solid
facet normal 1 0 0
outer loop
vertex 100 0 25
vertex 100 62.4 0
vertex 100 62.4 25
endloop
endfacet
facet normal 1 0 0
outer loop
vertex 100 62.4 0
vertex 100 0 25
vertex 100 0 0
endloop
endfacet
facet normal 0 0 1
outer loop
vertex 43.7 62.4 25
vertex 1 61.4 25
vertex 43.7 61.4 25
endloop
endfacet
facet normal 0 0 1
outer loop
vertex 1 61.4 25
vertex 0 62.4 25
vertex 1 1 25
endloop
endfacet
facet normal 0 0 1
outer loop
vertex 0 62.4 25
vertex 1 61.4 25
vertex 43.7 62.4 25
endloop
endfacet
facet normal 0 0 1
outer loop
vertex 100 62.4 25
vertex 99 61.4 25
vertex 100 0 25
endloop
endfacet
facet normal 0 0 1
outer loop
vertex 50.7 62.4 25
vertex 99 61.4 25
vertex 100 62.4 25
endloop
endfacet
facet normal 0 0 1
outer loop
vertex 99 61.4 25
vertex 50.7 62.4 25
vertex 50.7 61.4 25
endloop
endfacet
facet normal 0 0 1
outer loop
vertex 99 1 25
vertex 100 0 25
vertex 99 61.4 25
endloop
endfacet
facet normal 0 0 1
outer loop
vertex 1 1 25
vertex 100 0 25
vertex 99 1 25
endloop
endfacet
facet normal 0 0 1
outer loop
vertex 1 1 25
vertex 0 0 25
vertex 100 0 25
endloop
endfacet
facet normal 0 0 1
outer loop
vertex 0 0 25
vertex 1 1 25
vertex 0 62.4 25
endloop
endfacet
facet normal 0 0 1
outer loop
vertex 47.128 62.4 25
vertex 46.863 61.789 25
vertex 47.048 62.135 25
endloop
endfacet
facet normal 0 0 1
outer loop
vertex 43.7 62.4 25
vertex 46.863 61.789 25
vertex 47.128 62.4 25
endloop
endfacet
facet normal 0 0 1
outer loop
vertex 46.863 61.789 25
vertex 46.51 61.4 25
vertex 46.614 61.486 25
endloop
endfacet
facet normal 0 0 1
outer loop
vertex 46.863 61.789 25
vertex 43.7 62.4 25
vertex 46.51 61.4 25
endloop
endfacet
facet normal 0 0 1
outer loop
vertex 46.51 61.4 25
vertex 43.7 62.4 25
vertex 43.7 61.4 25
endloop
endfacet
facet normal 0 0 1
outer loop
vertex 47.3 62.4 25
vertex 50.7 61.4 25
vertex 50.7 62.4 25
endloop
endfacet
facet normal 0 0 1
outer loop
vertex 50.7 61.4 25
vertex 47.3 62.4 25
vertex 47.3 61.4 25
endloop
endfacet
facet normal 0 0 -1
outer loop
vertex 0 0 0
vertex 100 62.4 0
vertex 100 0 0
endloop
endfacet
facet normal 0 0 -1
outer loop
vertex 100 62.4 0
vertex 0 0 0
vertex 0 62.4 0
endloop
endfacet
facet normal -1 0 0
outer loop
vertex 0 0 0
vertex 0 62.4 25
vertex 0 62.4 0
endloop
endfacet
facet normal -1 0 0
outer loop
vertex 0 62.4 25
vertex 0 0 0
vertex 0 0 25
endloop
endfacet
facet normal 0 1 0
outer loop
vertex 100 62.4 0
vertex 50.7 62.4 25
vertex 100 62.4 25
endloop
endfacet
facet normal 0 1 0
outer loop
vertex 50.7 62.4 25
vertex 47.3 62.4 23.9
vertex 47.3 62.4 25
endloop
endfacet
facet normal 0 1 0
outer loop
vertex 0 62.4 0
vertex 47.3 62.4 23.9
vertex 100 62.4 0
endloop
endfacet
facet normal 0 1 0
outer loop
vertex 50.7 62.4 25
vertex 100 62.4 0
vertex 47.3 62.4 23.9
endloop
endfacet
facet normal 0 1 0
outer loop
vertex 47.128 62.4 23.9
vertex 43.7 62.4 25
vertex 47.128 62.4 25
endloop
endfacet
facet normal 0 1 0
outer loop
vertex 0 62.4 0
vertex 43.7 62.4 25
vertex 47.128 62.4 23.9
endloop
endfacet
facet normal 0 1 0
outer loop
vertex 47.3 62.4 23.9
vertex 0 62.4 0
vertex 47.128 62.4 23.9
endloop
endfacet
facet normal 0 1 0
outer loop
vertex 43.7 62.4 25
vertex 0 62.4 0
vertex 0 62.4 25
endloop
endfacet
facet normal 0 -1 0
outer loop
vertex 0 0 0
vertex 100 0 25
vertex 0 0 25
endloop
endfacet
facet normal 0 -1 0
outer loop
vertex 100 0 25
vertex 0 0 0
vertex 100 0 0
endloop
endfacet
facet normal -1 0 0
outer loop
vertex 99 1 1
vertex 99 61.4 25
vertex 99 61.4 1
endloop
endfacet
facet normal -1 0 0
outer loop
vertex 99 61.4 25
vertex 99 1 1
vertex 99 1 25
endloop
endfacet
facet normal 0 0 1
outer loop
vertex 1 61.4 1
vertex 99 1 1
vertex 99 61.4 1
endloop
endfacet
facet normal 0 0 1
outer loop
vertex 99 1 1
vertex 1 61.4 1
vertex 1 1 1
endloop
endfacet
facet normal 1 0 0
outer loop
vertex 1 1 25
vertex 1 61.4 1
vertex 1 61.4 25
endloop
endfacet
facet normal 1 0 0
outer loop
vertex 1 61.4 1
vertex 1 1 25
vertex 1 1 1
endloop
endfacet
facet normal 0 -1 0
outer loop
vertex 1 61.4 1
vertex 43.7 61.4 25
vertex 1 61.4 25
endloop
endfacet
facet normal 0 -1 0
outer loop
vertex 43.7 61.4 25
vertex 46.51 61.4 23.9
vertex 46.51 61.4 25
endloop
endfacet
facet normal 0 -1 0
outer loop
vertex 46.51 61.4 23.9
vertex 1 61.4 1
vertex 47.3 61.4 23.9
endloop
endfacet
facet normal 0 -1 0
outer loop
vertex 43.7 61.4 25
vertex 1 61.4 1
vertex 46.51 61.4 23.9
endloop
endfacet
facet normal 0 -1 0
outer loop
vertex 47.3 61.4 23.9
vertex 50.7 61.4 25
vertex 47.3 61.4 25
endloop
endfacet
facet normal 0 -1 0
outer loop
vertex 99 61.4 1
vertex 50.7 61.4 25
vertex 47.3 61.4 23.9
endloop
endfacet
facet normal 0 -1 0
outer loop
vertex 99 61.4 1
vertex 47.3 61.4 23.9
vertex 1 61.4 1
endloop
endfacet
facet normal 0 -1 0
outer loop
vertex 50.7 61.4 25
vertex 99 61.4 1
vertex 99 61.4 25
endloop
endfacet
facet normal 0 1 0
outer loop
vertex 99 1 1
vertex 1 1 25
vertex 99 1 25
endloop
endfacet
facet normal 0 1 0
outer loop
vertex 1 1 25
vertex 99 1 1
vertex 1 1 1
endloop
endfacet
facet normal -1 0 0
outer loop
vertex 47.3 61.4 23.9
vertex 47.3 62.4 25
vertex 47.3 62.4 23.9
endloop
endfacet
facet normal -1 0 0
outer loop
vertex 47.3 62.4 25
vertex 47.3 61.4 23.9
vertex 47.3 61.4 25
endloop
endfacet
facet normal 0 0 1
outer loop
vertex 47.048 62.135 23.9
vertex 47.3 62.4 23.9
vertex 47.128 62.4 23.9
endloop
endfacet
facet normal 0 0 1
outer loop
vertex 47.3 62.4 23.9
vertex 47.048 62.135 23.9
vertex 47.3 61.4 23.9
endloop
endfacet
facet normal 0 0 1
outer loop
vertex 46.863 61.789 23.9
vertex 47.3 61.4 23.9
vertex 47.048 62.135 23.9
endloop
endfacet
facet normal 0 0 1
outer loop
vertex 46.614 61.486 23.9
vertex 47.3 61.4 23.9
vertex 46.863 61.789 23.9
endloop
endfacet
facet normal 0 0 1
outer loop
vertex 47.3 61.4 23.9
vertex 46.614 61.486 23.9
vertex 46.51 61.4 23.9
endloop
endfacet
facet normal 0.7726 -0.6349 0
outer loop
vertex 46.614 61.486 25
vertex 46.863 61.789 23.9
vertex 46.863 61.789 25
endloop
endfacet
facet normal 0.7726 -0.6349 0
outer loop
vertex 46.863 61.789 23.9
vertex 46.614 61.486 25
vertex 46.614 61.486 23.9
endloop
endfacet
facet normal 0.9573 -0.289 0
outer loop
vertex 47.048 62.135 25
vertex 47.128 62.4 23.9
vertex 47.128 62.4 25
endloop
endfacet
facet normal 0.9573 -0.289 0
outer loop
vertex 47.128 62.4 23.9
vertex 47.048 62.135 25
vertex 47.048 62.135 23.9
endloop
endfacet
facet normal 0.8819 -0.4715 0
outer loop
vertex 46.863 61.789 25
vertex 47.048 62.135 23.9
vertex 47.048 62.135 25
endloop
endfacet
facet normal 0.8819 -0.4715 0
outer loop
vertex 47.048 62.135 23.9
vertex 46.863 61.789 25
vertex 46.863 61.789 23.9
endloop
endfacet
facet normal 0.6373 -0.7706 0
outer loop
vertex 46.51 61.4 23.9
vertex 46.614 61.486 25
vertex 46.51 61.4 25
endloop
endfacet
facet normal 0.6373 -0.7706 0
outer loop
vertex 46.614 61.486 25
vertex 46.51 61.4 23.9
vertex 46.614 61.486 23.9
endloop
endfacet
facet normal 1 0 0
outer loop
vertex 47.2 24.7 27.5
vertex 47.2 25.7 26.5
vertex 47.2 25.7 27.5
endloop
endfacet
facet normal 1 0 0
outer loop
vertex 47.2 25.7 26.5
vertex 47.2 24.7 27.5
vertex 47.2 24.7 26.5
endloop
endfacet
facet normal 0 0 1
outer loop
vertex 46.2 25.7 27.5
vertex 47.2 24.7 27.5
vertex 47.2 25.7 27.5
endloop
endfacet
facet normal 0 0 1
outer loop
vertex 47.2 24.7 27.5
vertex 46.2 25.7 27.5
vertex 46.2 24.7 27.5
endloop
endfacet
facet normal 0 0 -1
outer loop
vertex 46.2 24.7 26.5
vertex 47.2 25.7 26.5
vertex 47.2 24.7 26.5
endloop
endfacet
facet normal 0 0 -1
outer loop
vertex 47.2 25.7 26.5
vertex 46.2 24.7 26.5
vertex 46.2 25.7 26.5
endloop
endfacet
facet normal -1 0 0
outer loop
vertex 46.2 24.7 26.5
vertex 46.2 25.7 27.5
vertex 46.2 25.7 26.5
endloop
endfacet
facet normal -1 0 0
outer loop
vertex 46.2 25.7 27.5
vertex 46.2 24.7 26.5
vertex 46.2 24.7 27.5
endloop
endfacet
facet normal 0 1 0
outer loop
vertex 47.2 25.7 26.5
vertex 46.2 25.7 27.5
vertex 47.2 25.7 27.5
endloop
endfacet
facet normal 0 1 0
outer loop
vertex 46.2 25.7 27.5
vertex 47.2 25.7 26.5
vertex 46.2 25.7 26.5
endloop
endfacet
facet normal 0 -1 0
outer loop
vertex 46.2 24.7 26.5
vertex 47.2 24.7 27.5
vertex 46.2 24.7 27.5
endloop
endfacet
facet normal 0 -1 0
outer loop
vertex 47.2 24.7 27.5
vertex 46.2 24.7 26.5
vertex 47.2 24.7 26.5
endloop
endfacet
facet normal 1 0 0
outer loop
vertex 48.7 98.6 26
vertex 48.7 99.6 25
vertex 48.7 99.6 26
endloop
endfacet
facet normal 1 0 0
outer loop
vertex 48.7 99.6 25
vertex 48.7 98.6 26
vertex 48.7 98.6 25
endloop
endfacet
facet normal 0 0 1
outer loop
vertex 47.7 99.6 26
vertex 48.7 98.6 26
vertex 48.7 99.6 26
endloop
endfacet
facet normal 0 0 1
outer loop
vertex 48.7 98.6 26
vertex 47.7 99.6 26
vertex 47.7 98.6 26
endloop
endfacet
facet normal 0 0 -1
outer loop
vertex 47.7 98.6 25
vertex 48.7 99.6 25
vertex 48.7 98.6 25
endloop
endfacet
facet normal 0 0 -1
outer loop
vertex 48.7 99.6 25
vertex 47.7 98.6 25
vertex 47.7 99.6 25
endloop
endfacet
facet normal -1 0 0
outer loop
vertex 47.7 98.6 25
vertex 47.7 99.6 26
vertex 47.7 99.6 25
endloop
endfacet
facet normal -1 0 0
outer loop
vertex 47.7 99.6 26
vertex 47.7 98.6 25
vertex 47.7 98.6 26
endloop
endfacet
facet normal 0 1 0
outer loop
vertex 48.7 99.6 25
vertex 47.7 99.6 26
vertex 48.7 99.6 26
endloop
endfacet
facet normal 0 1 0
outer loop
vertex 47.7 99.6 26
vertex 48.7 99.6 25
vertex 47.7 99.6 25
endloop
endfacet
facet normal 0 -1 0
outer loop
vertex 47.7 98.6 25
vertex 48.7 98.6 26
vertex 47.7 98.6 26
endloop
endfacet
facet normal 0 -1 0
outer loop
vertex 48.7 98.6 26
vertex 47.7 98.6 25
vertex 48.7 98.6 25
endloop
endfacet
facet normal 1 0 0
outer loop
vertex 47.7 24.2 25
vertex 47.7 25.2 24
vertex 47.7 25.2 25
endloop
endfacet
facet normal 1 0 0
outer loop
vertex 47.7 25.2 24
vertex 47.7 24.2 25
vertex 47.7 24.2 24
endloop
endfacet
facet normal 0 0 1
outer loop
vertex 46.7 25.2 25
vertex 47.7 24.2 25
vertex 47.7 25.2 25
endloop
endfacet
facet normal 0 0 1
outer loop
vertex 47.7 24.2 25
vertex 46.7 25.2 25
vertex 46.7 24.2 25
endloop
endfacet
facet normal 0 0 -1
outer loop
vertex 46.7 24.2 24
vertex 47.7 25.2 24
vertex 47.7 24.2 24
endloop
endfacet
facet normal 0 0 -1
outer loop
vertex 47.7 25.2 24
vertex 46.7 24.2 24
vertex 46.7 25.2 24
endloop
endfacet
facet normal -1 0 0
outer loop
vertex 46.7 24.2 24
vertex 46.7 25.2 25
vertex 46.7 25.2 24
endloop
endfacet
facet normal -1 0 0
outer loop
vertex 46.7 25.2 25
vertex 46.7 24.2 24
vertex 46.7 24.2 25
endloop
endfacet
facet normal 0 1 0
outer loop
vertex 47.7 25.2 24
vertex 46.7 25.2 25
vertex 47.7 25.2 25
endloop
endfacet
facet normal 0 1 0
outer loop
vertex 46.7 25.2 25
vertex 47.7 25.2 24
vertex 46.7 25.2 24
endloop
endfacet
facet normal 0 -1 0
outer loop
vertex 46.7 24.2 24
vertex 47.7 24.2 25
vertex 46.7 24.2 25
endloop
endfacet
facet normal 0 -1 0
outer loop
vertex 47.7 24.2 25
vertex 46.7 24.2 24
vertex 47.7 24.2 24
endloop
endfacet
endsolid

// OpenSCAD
// file: testRC.scad
use<mylib.scad>;

t0 = 1;
// clang-format off
// test rc

  // idc?: color
  // rid: plane of corner cut (rotates the cut segment)
  // ---- 0: [-90,0,0] 1: [0, -90, 0] 2: [0, 0, -90]
  // rot: applied to given cube to put in in plane of rid
  // cxyz: cube to rotate
  // trans: for each corner; +/- cube radius
  // ss: show segment (false)
  module test(idc, rid, rot, cxyz, trans, ss = true) {
    if (idc) {
    translate(trans[0]) color("blue") cube([ 1, 1, 1 ], true);
    rc(trans[0], rid, 0, 5, t0, ss)
    rc(trans[1], rid, 1, 5, t0, ss)
    rc(trans[2], rid, 2, 5, t0, ss)
    rc(trans[3], rid, 3, 5, t0, ss)
    rotate(rot) color (idc)  cube(cxyz, true); // Y -> X
    }
  }
  module test0(idc, rid, rot, cxyz, trans, ss= false) {
    rrot = [ [ 0, -90, 0 ], [ -90, 0, 0 ], [ 0, 0, -90 ] ][rid];
    if (idc) {
    translate(trans[0]) color("blue") cube([ 1, 1, 1 ], true);
    rc0(trans[0], rid, 0, 5, t0, ss)
    rc0(trans[1], rid, 1, 5, t0, ss)
    rc0(trans[2], rid, 2, 5, t0, ss)
    rc0(trans[3], rid, 3, 5, t0, ss)
    rotate(rot) color(idc)  cube(cxyz, true); // Y -> X
    }
  }

module testRC() {
  t = t0;
  sz = false;
  szx = "tan";
  szy = "cyan";
  sx = false;
  sy0 = "green";//false; //
  syx = false;
  syxc = "#BBBBBB";// "#BBBBBB";
  syz = false;// "red";

  // rc() WORKS without test module!
  tt=t0/2; // offset because cube is rotated but not centered
  translate([20, 5, 0]) {
  translate([0,20,tt]) color("blue") cube([ 1, 1, 1 ], true);
  color("cyan") 
  rc([0,20,tt], 2, 0, 5, t0,true) 
  rc([20,20,tt], 2, 1, 5,t0,true) 
  rc([20,0,tt], 2, 2, 5, t0,true)
  rc([0,00,tt], 2, 3, 5, t0,true) 
  cube([20, 20, t0]);
  }

  // original test with rc0() [implicit gold]
  translate([-10, -30, 0]) 
  rc0([0,00,0], [0, 0, 0], 0, 5, t0,true) 
  rc0([0,20,0], [0, 0, 0], 1, 5,t0,true) 
  rc0([20,20,0], [0, 0, 0], 2, 5, t0,true)
  rc0([20,00,0], [0, 0, 0], 3, 5, t0,true) 
  cube([20, 20, t0]);

  gold = "gold";
  // z-axis test: using test0; fails because of module!
  translate([25, -20, 0]) 
  test0(gold, 2, [0, 0, 0], [20, 20, t0], [
    [-10,-10,-tt], [-10,10,-tt],[10,10,-tt], [10,-10,-tt]
  ], true) 

  // native Y -> X [green] (first test)
  test(syxc, 0, [0,0,-90], [20, t, 20], [
    [00,-10,-10],
    [00, 10,-10],
    [00, 10, 10],
    [00, -10,10]
    ]);
  // native Y -> Y [grey]
  translate([20,20,20])
  test(sy0, 0, [0,0,0], [20, t, 20], [
    [-10,00,10],
    [-10,00,-10],
    [10,00,-10],
    [10,00,10],
  ]);

  // native Y -> Z [red]
  test(syz, 2, [-90,0,0], [20, t, 20], [
    [-10,10,00],
    [10,10,00],
    [10,-10,00],
    [-10,-10,00],
  ]);

  // native Y -> Z [red]
  *if (syz) color (syz) 
  translate([0, 0, 0]) 
  rc0([00,20,0], [0, 0, -90], 0, 5, 1, syz) 
  rc0([20,20,00], [0, 0, -90], 1, 5, 1, syz) 
  rc0([20,00,00], [0, 0, -90], 2, 5, 1, syz)
  rc0([0,0,0], [0, 0, -90], 3, 5, 1, syz) 
  rotate([-90,0,0]) cube([20, t0, 20]); // y -> Z

  // native Z:
  if (sz) color(sz)
  translate([0, 0, 0]) 
  rc0([0,00,0], [0, 0, 0], 0, 5, 1, sz) 
  rc0([0,20,0], [0, 0, 0], 1, 5, 1, sz) 
  rc0([20,20,0], [0, 0, 0], 2, 5, 1, sz)
  rc0([20,00,0], [0, 0, 0], 3, 5, 1, sz) 
  cube([20, 20, t0]); // native: normal to Z

  // native Z rotated to X
  // if (szx) color(szx)
  // translate([0, 0, 0])
  // amul(csr, -rad)
  translate([-10, -20, -10]) 
  test(szx, 1, [0, -90, 0], [20, 20, t0], [
    [0,  -10, -10], [0, 10, -10], [0, 10, 10], [0, -10, 10], 
  ], true);

  // native Z rotated to Y
  test(szy, 0, [-90, 0, 0], [20, 20, t0], [
    [-10, 0,  10], [-10, 0, -10], [10, 0, -10], [10, 0, 10], 
  ])

*  if (szy) color(szy)
  translate([0, 0, 0]) 
  rc0([0,00,0], [-90, 0, 0], 0, 5, 1, szy) 
  rc0([0,0,-20], [-90, 0, 0], 1, 5, 1, szy) 
  rc0([20,0,-20], [-90, 0, 0], 2, 5, 1, szy)
  rc0([20,00,0], [-90, 0, 0], 3, 5, 1, szy) 
  rotate([-90, 0, 0]) cube([20, 20, t0]);

  // if (sy0) color (sy0) 
  // translate([0, 0, 0]) 
  // rc0([00,00,20], [-90, 0, 0], 0, 5, 1, sy0) 
  // rc0([00,00,00], [-90, 0, 0], 1, 5, 1, sy0) 
  // rc0([20,00,00], [-90, 0, 0], 2, 5, 1, sy0)
  // rc0([20,00,20], [-90, 0, 0], 3, 5, 1, sy0) 
  // cube([20, t0, 20]); // native normal = y

  // native Y -> X [green]
  if (syx) color (syx) 
  translate([0, 0, 0]) 
  rc0([00,-20,00], [0, -90, 0], 0, 5, 1, syx) 
  rc0([00,00,00], [0, -90, 0], 1, 5, 1, syx) 
  rc0([0,00,20], [0, -90, 0], 2, 5, 1, syx)
  rc0([0,-20,20], [0, -90, 0], 3, 5, 1, syx) 
  rotate([0,0,-90]) cube([20, t0, 20]); // Y -> X


}
// clang-format on
// main file
use <mylib.scad>;
p = .001;
pp = 2 * p;
t0 = 1.0;
l00 = 87; // official card size (according to Sleeve King )
w00 = 56;
l0 = 92.4;
w0 = 60.4;
h0 = 22;
h1 = h0 + 3; // extend for ramp!
l = l0 + 2 * t0;
w = w0 + 2 * t0;
h = h1 + t0;

// hypotenuse: given angle * adjacent_base length
function hypa(a, b) = (let(h = b * tan(a)) sqrt(b * b + h * h));
function hypo(a, h) = (let(b = h / tan(a)) sqrt(b * b + h * h));

// poke holes (children(1)) in children(0) through the y axis
// x: [x0, step, xm]
// z: [z0, step, zm]
// tr: [1,0,1] select axiis to translate
module gridify(x, z, tr = [ 1, 0, 1 ])
{
    for (xa = [x[0]:x[1]:x[2]], za = [z[0]:z[1]:z[2]])
    {
        // echo("xz=", [xa, za]);
        translate(amul([ xa, xa, za ], tr)) children(0);
    }
}
module grid(nx, nz, k, tr = [ 1, 0, 1 ])
{
    gridify([ k, 2 * k, nx ], [ 0, 2 * k, nz ], tr) children(0);
    gridify([ 0, 2 * k, nx ], [ k, 2 * k, nz ], tr) children(0);
}
module pat(s = 5, l = 30)
{
    rotatet([ 0, 45, 0 ], [ s / 2, 0, s / 2 ]) translate([ 0, -p, 0 ]) cube([ s, l + pp, s ]);
}

// grid test:
*translate([ 0, -40, 0 ])
{
    nx = 50;
    nz = 30;
    y = 1;
    s = 10;
    difference()
    {
        cube([ nx, y, nz ]);
        grid(nx, nz, s / 2) scale([ 1, 1, .7 ]) translate([ -s / 2, 0, -s / 2 ]) pat(s / 2, y);
    }
}

a = 18;
dz = 6;                 // top of slot
iw = 3.8;               // width of slot_interior
xb = (h - dz) * tan(a); // length of holder after tilt...
lt = l + xb;            // length total
echo("cardbox: xb, lt, lwh=", [ xb, lt, l, w, h ]);
// TODO: snap-on top!

module holder(a = a)
{
    xb = (h - dz) * tan(a); // length of holder after tilt...
    ha = (h - dz);
    echo();                // top to slot
    fw = iw + 2 * t0;      // full width of slot box
    hb = ha - fw / cos(a); // down from top to rotation point
    hr = ha - hb;
    sz = 5;   // depth to shelf
    echo("xb=", xb, "ha=", ha, "hb=", hb, "hr=", hr);
    wb = w0;
    intersection()
    {
        translate([ p - xb, 0, 0 ]) cube([ xb, w, h ]);
        {
            rotatet([ 0, -a, 0 ], [ 0, 0, dz ])
            {
                translate([ fw, 0, 0 ]) cube([ 7, w, 1.2 * h ]); // fill w/ giant block, then intersect
                {
                    bh = t0 + ((a > 1) ? ha / cos(a) : ha);
                    echo("bh=", bh);
                    translate([ 0, 0, dz ]) 
                    box([ fw, w, bh ], t0); // main box

                    translate([ 0, 0, bh - sz ]) 
                    rotatet([ 0, -18, 0 ], [ iw, 0, 2 * t0 ])
                    cube([ iw + t0, w, t0 ]); // bottom shelf
                }
            }
        }
    }
    // translate([-t0,0,-bl]) rotate([-90,0,0]) cylinder([iw+2*t0, w, bl]);
}

module card(tr = [ (l0 - l00) / 2, (w0 - w00) / 2, 0 ])
{
    translate(tr) astack(32, [ -.03, 0, .5 ]) color("pink") roundedCube([ l00, w00, .4 ], 3, true);
}

// vz: height of ramp @ vx: bump @
vz = 4.;
vx = .4 * l;
fl = 2;
vy = 5.6; // fl: flat length
module ramp(vx = vx, vz = vz, ve = 0)
{
    sa = sin(a2);
    ca = cos(a2);
    vz = (l - vx) * sa;
    vzt = vz + t0; // vz = 3.16
    intersection()
    {
        union()
        {
            rotatet([ 0, -a2-.2, 0 ], [ vx, 0, vz + t0 ]) 
            for (y = [0:(w - vy) / 4:w - vy]) 
            translate([ ve, y, 0 ])
              cube([ vx, vy, vz + t0 ]);
            translate([ vx, 0, 0 ]) cube([ 2.4, w, vz + t0 ]);
        }
        translate([ ve, 0, 0 ]) cube([ vx, w, vz + t0 ]);
    }
    dr = 14;
    intersection()
    {
        translate([ vx + (dr / 2 + .0) * t0, w / 2, vzt / 2 ]) rotate([ -90, 0, 0 ]) cube([ dr, vzt, w ], true);
        color("blue") translate([ vx + (dr / 2 + 0) * t0, w / 2, vzt / 2 ])
            rotatet([ 0, a2, 0 ], [ -dr / 2, 0, vzt / 2 ]) rotate([ -90, 0, 0 ])
                cube([ dr, vzt, w ], true); // no compound rotation!
    }
}
/* clang-format off */

/** try to hold inline cards, also a "lid" to hold cards in box
 @param dx length of tray
 @param dz height of wings
 @ambient w: width of box, t0: thickness
 */
module topTray(dx = l/4, dz = 5)
{

    f = .33;
    tw = w - 2 * t0;
    sw = 2 * t0;
    atrans(loc, [ [ l+2, 0, dx, [0, 90, 0] ], 
                [ (l-dx)/2-10, 0, h-dz+t0 ], 
                [ (l-dx)/2-10, 0, h-dz+t0+p ],
          ])
    /* clang-format on */
    {
        rz = 5;
        in = f;
        dup([ 0, w, 0], [0,0,180, [dx/2, 0, 0]])
        union() {
          translate([0, p+t0, 0]) cube([dx, w/2+t0+p, t0]);
          color("blue") translate([ p, p, p ]) 
            box([ dx, sw, dz ], [ -t0, -t0, -t0 ], [ 2, 0, 0 ]);
        }
    }
}


// box for setup (Events, VICI, markers, chips) cards:
module vbox()
{
  vw = l;
  vl = 22;
  vh = w; // as high as main box is wide
  sw = 55;// vw * .7;
  dh = 15; // depth of slot
  sr = min(5, dh/2, sw/2);
  hwtr = [dh, sw, 2*t0, sr];
  atrans(loc, [[0, -3, 0, [0,0,-90]], [0, -vw, 0], [0, -3, 0, [0,0,-90]]]){ 
  echo("vbox2:", [dh, sw, 2*t0, sr])
  slotify(hwtr, [00+t0/2, vw/2, vh-(dh/2-sr)], 1, 3, true)
  slotify(hwtr, [vl-t0/2, vw/2, vh-(dh/2-sr)], 1, 3, true)
    box([vl, vw, vh]);
  sz = 20/32 * vl;
  slotify(hwtr, [sz+t0/2, vw/2, vh-(dh/2-sr)], 1, 3, true)
    div([vh, vw, sz]);
  }
}

// add horizontal slot to children(0)
module hslot(dz = dz, dx = 0)
{
    sw = 2;
    sh = 4;
    difference()
    {
        union()
        children();
        translate([dx - (sw - pp) / 2, t0, dz - sh ]) 
        cube([ sw, w0, sh ]);
    }
    // support posts:
    dia = 1;
    dup([0, -w/4, 0])
    dup([0, +w/4, 0])
    translate([ 0, w / 2, 0 ]) cube([ dia, dia, dz ]);
}

// cut child(0) in XY plane @ depth: y0..y1
module cutaway0(loc = loc, cxyz = [ 10, 10, 10 ], txyz = [ -5, -5, -5 ])
{
    if (loc == 1)
    {
        difference()
        {
            children(0);
            translate(txyz) cube(cxyz);
        }
    }
    else
    {
        children(0);
    }
}
module cutaway(loc = loc)
{
    cutaway0(loc, [ lt + 10, 10, h + 10 ], [ -5 - xb, -5, -5 ]) children();
}

module paty(s = 5, l = w)
{
    scale([ 1, 1, .7 ]) translate([ -s / 4, 0, -s / 2.8 ]) pat(s / 2, l);
}
module patx(s = 5, l = w)
{
    scale([ 1, 1, .7 ]) translate([ 0, -s / 4, -s / 2.8 ]) rotatet([ 45, 0, 0 ], [ 0, s / 2, s / 2 ])
        translate([ -p, 0, 0 ]) cube([ l + pp, s, s ]);
}

module gridaway(x0 = 40, l = l * .65, h = 25)
{
    s = 10;
    difference()
    {
        children(0);
        translate([ x0, 0, t0 + s * .9 ]) grid(l - s - x0, h - s - 5, 5) paty(s, w);
    }
}
module gridawayy(x0 = 20, l = l)
{
    s = 10;
    difference()
    {
        children(0);
        translate([ x0, 0, t0 + s ]) grid(l - s - x0, h - s - 5, 5) paty(s, w);
    }
}
module gridawayx(x0 = 20, w = w)
{
    s = 10;
    difference()
    {
        children(0);
        translate([ -10, x0, t0 + s ])
            // rotatet([0, 0, -90], [-20, 0, 20])
            grid(w - s - x0, h - s - 5, 5, [ 0, 1, 1 ]) patx(s / 2, 20);
    }
}

module mainBox()
{
  sw = 20; // half width
  sr = 10;  // slot radius
  rq = 3; // rq if different from sr

  sh = 1; sl = (l-20); r = 2; ds = .1;
  hds = 3.5;      // bottom of slot
  slh = h+sr-hds; // slot height: sr at top of box
  hslot()
  {
    holder();
    // end slot:
    slotify([slh, sw, 2*t0, sr], [l-t0/2, w/2, hds+slh/2], 1, [3, 1], true )

    // corner should be: [l, h, w/2 +- sr] => [100.9, 26, 43.2--53.2 (47.2  +- 4)]
    // 2 top-side slots: (fat slow for test)
    slotify([sl, sh, 2*t0, r], [l/2, 0+t0/2, h], 0, [2, 0], true)
    echo("-----SLOTIFY:--------", [0,90,90], [2, 0])
    slotify([sh, sl, 2*t0, r], [l/2, w-t0/2, h], [0,90,90], [2, 0], true)
    // test: botton slot
    // slotify([slh, sw, 2*t0, sr], [l-t0/2+8, w/2, t0/2], [0,0,0, 0], [3, 2], true )
        box([ l, w, h ], t0);
    ramp();
  }
}
module slottest() {
  sw = 20; // half width
  sr = 10;  // slot radius
  rq = 3; // rq if different from sr

  sh = 1; sl = (l-20); r = 2; ds = .1;
  hds = 3.5;      // bottom of slot
  slh = h+sr-hds; // slot height: sr at top of box
  rot = [0,0,0]; riq = [2, 0];
  echo("-----SLOTIFY TEST:--------", rot, riq);
  slotify([sh, sl, 2*t0, r], [l/2, w-t0/2, h], rot, riq, true)
    box([100, w, 25], t0);
}

loc = 0;
use<testRC.scad>;
*translate([-50, -40, 0])  testRC();
///
/// MAIN BUILD HERE:
///
*cutaway() gridaway() mainBox();
slottest();
*topTray();
*dup([ 0, -25, 0 ]) vbox();

dy = 10;
dr = 5; // rCube test
*translate([ 0, 0, 0 ]) roundedCube([ dy, dy / 2, 3 ], dr, true);
*roundedRect([ dy, dy ], 1);

// atan(6/88) = 4;
// atan(7/88) = 4.5;
a2 = 3.2; // angle of the card on ramp
if (loc != 0)
    *translate([ 0, 0, .1 ]) rotatet([ 0, a2, 0 ], [ 90, 0, 1 ]) card([ 4, (w0 - w00) / 2, 1 ]);
